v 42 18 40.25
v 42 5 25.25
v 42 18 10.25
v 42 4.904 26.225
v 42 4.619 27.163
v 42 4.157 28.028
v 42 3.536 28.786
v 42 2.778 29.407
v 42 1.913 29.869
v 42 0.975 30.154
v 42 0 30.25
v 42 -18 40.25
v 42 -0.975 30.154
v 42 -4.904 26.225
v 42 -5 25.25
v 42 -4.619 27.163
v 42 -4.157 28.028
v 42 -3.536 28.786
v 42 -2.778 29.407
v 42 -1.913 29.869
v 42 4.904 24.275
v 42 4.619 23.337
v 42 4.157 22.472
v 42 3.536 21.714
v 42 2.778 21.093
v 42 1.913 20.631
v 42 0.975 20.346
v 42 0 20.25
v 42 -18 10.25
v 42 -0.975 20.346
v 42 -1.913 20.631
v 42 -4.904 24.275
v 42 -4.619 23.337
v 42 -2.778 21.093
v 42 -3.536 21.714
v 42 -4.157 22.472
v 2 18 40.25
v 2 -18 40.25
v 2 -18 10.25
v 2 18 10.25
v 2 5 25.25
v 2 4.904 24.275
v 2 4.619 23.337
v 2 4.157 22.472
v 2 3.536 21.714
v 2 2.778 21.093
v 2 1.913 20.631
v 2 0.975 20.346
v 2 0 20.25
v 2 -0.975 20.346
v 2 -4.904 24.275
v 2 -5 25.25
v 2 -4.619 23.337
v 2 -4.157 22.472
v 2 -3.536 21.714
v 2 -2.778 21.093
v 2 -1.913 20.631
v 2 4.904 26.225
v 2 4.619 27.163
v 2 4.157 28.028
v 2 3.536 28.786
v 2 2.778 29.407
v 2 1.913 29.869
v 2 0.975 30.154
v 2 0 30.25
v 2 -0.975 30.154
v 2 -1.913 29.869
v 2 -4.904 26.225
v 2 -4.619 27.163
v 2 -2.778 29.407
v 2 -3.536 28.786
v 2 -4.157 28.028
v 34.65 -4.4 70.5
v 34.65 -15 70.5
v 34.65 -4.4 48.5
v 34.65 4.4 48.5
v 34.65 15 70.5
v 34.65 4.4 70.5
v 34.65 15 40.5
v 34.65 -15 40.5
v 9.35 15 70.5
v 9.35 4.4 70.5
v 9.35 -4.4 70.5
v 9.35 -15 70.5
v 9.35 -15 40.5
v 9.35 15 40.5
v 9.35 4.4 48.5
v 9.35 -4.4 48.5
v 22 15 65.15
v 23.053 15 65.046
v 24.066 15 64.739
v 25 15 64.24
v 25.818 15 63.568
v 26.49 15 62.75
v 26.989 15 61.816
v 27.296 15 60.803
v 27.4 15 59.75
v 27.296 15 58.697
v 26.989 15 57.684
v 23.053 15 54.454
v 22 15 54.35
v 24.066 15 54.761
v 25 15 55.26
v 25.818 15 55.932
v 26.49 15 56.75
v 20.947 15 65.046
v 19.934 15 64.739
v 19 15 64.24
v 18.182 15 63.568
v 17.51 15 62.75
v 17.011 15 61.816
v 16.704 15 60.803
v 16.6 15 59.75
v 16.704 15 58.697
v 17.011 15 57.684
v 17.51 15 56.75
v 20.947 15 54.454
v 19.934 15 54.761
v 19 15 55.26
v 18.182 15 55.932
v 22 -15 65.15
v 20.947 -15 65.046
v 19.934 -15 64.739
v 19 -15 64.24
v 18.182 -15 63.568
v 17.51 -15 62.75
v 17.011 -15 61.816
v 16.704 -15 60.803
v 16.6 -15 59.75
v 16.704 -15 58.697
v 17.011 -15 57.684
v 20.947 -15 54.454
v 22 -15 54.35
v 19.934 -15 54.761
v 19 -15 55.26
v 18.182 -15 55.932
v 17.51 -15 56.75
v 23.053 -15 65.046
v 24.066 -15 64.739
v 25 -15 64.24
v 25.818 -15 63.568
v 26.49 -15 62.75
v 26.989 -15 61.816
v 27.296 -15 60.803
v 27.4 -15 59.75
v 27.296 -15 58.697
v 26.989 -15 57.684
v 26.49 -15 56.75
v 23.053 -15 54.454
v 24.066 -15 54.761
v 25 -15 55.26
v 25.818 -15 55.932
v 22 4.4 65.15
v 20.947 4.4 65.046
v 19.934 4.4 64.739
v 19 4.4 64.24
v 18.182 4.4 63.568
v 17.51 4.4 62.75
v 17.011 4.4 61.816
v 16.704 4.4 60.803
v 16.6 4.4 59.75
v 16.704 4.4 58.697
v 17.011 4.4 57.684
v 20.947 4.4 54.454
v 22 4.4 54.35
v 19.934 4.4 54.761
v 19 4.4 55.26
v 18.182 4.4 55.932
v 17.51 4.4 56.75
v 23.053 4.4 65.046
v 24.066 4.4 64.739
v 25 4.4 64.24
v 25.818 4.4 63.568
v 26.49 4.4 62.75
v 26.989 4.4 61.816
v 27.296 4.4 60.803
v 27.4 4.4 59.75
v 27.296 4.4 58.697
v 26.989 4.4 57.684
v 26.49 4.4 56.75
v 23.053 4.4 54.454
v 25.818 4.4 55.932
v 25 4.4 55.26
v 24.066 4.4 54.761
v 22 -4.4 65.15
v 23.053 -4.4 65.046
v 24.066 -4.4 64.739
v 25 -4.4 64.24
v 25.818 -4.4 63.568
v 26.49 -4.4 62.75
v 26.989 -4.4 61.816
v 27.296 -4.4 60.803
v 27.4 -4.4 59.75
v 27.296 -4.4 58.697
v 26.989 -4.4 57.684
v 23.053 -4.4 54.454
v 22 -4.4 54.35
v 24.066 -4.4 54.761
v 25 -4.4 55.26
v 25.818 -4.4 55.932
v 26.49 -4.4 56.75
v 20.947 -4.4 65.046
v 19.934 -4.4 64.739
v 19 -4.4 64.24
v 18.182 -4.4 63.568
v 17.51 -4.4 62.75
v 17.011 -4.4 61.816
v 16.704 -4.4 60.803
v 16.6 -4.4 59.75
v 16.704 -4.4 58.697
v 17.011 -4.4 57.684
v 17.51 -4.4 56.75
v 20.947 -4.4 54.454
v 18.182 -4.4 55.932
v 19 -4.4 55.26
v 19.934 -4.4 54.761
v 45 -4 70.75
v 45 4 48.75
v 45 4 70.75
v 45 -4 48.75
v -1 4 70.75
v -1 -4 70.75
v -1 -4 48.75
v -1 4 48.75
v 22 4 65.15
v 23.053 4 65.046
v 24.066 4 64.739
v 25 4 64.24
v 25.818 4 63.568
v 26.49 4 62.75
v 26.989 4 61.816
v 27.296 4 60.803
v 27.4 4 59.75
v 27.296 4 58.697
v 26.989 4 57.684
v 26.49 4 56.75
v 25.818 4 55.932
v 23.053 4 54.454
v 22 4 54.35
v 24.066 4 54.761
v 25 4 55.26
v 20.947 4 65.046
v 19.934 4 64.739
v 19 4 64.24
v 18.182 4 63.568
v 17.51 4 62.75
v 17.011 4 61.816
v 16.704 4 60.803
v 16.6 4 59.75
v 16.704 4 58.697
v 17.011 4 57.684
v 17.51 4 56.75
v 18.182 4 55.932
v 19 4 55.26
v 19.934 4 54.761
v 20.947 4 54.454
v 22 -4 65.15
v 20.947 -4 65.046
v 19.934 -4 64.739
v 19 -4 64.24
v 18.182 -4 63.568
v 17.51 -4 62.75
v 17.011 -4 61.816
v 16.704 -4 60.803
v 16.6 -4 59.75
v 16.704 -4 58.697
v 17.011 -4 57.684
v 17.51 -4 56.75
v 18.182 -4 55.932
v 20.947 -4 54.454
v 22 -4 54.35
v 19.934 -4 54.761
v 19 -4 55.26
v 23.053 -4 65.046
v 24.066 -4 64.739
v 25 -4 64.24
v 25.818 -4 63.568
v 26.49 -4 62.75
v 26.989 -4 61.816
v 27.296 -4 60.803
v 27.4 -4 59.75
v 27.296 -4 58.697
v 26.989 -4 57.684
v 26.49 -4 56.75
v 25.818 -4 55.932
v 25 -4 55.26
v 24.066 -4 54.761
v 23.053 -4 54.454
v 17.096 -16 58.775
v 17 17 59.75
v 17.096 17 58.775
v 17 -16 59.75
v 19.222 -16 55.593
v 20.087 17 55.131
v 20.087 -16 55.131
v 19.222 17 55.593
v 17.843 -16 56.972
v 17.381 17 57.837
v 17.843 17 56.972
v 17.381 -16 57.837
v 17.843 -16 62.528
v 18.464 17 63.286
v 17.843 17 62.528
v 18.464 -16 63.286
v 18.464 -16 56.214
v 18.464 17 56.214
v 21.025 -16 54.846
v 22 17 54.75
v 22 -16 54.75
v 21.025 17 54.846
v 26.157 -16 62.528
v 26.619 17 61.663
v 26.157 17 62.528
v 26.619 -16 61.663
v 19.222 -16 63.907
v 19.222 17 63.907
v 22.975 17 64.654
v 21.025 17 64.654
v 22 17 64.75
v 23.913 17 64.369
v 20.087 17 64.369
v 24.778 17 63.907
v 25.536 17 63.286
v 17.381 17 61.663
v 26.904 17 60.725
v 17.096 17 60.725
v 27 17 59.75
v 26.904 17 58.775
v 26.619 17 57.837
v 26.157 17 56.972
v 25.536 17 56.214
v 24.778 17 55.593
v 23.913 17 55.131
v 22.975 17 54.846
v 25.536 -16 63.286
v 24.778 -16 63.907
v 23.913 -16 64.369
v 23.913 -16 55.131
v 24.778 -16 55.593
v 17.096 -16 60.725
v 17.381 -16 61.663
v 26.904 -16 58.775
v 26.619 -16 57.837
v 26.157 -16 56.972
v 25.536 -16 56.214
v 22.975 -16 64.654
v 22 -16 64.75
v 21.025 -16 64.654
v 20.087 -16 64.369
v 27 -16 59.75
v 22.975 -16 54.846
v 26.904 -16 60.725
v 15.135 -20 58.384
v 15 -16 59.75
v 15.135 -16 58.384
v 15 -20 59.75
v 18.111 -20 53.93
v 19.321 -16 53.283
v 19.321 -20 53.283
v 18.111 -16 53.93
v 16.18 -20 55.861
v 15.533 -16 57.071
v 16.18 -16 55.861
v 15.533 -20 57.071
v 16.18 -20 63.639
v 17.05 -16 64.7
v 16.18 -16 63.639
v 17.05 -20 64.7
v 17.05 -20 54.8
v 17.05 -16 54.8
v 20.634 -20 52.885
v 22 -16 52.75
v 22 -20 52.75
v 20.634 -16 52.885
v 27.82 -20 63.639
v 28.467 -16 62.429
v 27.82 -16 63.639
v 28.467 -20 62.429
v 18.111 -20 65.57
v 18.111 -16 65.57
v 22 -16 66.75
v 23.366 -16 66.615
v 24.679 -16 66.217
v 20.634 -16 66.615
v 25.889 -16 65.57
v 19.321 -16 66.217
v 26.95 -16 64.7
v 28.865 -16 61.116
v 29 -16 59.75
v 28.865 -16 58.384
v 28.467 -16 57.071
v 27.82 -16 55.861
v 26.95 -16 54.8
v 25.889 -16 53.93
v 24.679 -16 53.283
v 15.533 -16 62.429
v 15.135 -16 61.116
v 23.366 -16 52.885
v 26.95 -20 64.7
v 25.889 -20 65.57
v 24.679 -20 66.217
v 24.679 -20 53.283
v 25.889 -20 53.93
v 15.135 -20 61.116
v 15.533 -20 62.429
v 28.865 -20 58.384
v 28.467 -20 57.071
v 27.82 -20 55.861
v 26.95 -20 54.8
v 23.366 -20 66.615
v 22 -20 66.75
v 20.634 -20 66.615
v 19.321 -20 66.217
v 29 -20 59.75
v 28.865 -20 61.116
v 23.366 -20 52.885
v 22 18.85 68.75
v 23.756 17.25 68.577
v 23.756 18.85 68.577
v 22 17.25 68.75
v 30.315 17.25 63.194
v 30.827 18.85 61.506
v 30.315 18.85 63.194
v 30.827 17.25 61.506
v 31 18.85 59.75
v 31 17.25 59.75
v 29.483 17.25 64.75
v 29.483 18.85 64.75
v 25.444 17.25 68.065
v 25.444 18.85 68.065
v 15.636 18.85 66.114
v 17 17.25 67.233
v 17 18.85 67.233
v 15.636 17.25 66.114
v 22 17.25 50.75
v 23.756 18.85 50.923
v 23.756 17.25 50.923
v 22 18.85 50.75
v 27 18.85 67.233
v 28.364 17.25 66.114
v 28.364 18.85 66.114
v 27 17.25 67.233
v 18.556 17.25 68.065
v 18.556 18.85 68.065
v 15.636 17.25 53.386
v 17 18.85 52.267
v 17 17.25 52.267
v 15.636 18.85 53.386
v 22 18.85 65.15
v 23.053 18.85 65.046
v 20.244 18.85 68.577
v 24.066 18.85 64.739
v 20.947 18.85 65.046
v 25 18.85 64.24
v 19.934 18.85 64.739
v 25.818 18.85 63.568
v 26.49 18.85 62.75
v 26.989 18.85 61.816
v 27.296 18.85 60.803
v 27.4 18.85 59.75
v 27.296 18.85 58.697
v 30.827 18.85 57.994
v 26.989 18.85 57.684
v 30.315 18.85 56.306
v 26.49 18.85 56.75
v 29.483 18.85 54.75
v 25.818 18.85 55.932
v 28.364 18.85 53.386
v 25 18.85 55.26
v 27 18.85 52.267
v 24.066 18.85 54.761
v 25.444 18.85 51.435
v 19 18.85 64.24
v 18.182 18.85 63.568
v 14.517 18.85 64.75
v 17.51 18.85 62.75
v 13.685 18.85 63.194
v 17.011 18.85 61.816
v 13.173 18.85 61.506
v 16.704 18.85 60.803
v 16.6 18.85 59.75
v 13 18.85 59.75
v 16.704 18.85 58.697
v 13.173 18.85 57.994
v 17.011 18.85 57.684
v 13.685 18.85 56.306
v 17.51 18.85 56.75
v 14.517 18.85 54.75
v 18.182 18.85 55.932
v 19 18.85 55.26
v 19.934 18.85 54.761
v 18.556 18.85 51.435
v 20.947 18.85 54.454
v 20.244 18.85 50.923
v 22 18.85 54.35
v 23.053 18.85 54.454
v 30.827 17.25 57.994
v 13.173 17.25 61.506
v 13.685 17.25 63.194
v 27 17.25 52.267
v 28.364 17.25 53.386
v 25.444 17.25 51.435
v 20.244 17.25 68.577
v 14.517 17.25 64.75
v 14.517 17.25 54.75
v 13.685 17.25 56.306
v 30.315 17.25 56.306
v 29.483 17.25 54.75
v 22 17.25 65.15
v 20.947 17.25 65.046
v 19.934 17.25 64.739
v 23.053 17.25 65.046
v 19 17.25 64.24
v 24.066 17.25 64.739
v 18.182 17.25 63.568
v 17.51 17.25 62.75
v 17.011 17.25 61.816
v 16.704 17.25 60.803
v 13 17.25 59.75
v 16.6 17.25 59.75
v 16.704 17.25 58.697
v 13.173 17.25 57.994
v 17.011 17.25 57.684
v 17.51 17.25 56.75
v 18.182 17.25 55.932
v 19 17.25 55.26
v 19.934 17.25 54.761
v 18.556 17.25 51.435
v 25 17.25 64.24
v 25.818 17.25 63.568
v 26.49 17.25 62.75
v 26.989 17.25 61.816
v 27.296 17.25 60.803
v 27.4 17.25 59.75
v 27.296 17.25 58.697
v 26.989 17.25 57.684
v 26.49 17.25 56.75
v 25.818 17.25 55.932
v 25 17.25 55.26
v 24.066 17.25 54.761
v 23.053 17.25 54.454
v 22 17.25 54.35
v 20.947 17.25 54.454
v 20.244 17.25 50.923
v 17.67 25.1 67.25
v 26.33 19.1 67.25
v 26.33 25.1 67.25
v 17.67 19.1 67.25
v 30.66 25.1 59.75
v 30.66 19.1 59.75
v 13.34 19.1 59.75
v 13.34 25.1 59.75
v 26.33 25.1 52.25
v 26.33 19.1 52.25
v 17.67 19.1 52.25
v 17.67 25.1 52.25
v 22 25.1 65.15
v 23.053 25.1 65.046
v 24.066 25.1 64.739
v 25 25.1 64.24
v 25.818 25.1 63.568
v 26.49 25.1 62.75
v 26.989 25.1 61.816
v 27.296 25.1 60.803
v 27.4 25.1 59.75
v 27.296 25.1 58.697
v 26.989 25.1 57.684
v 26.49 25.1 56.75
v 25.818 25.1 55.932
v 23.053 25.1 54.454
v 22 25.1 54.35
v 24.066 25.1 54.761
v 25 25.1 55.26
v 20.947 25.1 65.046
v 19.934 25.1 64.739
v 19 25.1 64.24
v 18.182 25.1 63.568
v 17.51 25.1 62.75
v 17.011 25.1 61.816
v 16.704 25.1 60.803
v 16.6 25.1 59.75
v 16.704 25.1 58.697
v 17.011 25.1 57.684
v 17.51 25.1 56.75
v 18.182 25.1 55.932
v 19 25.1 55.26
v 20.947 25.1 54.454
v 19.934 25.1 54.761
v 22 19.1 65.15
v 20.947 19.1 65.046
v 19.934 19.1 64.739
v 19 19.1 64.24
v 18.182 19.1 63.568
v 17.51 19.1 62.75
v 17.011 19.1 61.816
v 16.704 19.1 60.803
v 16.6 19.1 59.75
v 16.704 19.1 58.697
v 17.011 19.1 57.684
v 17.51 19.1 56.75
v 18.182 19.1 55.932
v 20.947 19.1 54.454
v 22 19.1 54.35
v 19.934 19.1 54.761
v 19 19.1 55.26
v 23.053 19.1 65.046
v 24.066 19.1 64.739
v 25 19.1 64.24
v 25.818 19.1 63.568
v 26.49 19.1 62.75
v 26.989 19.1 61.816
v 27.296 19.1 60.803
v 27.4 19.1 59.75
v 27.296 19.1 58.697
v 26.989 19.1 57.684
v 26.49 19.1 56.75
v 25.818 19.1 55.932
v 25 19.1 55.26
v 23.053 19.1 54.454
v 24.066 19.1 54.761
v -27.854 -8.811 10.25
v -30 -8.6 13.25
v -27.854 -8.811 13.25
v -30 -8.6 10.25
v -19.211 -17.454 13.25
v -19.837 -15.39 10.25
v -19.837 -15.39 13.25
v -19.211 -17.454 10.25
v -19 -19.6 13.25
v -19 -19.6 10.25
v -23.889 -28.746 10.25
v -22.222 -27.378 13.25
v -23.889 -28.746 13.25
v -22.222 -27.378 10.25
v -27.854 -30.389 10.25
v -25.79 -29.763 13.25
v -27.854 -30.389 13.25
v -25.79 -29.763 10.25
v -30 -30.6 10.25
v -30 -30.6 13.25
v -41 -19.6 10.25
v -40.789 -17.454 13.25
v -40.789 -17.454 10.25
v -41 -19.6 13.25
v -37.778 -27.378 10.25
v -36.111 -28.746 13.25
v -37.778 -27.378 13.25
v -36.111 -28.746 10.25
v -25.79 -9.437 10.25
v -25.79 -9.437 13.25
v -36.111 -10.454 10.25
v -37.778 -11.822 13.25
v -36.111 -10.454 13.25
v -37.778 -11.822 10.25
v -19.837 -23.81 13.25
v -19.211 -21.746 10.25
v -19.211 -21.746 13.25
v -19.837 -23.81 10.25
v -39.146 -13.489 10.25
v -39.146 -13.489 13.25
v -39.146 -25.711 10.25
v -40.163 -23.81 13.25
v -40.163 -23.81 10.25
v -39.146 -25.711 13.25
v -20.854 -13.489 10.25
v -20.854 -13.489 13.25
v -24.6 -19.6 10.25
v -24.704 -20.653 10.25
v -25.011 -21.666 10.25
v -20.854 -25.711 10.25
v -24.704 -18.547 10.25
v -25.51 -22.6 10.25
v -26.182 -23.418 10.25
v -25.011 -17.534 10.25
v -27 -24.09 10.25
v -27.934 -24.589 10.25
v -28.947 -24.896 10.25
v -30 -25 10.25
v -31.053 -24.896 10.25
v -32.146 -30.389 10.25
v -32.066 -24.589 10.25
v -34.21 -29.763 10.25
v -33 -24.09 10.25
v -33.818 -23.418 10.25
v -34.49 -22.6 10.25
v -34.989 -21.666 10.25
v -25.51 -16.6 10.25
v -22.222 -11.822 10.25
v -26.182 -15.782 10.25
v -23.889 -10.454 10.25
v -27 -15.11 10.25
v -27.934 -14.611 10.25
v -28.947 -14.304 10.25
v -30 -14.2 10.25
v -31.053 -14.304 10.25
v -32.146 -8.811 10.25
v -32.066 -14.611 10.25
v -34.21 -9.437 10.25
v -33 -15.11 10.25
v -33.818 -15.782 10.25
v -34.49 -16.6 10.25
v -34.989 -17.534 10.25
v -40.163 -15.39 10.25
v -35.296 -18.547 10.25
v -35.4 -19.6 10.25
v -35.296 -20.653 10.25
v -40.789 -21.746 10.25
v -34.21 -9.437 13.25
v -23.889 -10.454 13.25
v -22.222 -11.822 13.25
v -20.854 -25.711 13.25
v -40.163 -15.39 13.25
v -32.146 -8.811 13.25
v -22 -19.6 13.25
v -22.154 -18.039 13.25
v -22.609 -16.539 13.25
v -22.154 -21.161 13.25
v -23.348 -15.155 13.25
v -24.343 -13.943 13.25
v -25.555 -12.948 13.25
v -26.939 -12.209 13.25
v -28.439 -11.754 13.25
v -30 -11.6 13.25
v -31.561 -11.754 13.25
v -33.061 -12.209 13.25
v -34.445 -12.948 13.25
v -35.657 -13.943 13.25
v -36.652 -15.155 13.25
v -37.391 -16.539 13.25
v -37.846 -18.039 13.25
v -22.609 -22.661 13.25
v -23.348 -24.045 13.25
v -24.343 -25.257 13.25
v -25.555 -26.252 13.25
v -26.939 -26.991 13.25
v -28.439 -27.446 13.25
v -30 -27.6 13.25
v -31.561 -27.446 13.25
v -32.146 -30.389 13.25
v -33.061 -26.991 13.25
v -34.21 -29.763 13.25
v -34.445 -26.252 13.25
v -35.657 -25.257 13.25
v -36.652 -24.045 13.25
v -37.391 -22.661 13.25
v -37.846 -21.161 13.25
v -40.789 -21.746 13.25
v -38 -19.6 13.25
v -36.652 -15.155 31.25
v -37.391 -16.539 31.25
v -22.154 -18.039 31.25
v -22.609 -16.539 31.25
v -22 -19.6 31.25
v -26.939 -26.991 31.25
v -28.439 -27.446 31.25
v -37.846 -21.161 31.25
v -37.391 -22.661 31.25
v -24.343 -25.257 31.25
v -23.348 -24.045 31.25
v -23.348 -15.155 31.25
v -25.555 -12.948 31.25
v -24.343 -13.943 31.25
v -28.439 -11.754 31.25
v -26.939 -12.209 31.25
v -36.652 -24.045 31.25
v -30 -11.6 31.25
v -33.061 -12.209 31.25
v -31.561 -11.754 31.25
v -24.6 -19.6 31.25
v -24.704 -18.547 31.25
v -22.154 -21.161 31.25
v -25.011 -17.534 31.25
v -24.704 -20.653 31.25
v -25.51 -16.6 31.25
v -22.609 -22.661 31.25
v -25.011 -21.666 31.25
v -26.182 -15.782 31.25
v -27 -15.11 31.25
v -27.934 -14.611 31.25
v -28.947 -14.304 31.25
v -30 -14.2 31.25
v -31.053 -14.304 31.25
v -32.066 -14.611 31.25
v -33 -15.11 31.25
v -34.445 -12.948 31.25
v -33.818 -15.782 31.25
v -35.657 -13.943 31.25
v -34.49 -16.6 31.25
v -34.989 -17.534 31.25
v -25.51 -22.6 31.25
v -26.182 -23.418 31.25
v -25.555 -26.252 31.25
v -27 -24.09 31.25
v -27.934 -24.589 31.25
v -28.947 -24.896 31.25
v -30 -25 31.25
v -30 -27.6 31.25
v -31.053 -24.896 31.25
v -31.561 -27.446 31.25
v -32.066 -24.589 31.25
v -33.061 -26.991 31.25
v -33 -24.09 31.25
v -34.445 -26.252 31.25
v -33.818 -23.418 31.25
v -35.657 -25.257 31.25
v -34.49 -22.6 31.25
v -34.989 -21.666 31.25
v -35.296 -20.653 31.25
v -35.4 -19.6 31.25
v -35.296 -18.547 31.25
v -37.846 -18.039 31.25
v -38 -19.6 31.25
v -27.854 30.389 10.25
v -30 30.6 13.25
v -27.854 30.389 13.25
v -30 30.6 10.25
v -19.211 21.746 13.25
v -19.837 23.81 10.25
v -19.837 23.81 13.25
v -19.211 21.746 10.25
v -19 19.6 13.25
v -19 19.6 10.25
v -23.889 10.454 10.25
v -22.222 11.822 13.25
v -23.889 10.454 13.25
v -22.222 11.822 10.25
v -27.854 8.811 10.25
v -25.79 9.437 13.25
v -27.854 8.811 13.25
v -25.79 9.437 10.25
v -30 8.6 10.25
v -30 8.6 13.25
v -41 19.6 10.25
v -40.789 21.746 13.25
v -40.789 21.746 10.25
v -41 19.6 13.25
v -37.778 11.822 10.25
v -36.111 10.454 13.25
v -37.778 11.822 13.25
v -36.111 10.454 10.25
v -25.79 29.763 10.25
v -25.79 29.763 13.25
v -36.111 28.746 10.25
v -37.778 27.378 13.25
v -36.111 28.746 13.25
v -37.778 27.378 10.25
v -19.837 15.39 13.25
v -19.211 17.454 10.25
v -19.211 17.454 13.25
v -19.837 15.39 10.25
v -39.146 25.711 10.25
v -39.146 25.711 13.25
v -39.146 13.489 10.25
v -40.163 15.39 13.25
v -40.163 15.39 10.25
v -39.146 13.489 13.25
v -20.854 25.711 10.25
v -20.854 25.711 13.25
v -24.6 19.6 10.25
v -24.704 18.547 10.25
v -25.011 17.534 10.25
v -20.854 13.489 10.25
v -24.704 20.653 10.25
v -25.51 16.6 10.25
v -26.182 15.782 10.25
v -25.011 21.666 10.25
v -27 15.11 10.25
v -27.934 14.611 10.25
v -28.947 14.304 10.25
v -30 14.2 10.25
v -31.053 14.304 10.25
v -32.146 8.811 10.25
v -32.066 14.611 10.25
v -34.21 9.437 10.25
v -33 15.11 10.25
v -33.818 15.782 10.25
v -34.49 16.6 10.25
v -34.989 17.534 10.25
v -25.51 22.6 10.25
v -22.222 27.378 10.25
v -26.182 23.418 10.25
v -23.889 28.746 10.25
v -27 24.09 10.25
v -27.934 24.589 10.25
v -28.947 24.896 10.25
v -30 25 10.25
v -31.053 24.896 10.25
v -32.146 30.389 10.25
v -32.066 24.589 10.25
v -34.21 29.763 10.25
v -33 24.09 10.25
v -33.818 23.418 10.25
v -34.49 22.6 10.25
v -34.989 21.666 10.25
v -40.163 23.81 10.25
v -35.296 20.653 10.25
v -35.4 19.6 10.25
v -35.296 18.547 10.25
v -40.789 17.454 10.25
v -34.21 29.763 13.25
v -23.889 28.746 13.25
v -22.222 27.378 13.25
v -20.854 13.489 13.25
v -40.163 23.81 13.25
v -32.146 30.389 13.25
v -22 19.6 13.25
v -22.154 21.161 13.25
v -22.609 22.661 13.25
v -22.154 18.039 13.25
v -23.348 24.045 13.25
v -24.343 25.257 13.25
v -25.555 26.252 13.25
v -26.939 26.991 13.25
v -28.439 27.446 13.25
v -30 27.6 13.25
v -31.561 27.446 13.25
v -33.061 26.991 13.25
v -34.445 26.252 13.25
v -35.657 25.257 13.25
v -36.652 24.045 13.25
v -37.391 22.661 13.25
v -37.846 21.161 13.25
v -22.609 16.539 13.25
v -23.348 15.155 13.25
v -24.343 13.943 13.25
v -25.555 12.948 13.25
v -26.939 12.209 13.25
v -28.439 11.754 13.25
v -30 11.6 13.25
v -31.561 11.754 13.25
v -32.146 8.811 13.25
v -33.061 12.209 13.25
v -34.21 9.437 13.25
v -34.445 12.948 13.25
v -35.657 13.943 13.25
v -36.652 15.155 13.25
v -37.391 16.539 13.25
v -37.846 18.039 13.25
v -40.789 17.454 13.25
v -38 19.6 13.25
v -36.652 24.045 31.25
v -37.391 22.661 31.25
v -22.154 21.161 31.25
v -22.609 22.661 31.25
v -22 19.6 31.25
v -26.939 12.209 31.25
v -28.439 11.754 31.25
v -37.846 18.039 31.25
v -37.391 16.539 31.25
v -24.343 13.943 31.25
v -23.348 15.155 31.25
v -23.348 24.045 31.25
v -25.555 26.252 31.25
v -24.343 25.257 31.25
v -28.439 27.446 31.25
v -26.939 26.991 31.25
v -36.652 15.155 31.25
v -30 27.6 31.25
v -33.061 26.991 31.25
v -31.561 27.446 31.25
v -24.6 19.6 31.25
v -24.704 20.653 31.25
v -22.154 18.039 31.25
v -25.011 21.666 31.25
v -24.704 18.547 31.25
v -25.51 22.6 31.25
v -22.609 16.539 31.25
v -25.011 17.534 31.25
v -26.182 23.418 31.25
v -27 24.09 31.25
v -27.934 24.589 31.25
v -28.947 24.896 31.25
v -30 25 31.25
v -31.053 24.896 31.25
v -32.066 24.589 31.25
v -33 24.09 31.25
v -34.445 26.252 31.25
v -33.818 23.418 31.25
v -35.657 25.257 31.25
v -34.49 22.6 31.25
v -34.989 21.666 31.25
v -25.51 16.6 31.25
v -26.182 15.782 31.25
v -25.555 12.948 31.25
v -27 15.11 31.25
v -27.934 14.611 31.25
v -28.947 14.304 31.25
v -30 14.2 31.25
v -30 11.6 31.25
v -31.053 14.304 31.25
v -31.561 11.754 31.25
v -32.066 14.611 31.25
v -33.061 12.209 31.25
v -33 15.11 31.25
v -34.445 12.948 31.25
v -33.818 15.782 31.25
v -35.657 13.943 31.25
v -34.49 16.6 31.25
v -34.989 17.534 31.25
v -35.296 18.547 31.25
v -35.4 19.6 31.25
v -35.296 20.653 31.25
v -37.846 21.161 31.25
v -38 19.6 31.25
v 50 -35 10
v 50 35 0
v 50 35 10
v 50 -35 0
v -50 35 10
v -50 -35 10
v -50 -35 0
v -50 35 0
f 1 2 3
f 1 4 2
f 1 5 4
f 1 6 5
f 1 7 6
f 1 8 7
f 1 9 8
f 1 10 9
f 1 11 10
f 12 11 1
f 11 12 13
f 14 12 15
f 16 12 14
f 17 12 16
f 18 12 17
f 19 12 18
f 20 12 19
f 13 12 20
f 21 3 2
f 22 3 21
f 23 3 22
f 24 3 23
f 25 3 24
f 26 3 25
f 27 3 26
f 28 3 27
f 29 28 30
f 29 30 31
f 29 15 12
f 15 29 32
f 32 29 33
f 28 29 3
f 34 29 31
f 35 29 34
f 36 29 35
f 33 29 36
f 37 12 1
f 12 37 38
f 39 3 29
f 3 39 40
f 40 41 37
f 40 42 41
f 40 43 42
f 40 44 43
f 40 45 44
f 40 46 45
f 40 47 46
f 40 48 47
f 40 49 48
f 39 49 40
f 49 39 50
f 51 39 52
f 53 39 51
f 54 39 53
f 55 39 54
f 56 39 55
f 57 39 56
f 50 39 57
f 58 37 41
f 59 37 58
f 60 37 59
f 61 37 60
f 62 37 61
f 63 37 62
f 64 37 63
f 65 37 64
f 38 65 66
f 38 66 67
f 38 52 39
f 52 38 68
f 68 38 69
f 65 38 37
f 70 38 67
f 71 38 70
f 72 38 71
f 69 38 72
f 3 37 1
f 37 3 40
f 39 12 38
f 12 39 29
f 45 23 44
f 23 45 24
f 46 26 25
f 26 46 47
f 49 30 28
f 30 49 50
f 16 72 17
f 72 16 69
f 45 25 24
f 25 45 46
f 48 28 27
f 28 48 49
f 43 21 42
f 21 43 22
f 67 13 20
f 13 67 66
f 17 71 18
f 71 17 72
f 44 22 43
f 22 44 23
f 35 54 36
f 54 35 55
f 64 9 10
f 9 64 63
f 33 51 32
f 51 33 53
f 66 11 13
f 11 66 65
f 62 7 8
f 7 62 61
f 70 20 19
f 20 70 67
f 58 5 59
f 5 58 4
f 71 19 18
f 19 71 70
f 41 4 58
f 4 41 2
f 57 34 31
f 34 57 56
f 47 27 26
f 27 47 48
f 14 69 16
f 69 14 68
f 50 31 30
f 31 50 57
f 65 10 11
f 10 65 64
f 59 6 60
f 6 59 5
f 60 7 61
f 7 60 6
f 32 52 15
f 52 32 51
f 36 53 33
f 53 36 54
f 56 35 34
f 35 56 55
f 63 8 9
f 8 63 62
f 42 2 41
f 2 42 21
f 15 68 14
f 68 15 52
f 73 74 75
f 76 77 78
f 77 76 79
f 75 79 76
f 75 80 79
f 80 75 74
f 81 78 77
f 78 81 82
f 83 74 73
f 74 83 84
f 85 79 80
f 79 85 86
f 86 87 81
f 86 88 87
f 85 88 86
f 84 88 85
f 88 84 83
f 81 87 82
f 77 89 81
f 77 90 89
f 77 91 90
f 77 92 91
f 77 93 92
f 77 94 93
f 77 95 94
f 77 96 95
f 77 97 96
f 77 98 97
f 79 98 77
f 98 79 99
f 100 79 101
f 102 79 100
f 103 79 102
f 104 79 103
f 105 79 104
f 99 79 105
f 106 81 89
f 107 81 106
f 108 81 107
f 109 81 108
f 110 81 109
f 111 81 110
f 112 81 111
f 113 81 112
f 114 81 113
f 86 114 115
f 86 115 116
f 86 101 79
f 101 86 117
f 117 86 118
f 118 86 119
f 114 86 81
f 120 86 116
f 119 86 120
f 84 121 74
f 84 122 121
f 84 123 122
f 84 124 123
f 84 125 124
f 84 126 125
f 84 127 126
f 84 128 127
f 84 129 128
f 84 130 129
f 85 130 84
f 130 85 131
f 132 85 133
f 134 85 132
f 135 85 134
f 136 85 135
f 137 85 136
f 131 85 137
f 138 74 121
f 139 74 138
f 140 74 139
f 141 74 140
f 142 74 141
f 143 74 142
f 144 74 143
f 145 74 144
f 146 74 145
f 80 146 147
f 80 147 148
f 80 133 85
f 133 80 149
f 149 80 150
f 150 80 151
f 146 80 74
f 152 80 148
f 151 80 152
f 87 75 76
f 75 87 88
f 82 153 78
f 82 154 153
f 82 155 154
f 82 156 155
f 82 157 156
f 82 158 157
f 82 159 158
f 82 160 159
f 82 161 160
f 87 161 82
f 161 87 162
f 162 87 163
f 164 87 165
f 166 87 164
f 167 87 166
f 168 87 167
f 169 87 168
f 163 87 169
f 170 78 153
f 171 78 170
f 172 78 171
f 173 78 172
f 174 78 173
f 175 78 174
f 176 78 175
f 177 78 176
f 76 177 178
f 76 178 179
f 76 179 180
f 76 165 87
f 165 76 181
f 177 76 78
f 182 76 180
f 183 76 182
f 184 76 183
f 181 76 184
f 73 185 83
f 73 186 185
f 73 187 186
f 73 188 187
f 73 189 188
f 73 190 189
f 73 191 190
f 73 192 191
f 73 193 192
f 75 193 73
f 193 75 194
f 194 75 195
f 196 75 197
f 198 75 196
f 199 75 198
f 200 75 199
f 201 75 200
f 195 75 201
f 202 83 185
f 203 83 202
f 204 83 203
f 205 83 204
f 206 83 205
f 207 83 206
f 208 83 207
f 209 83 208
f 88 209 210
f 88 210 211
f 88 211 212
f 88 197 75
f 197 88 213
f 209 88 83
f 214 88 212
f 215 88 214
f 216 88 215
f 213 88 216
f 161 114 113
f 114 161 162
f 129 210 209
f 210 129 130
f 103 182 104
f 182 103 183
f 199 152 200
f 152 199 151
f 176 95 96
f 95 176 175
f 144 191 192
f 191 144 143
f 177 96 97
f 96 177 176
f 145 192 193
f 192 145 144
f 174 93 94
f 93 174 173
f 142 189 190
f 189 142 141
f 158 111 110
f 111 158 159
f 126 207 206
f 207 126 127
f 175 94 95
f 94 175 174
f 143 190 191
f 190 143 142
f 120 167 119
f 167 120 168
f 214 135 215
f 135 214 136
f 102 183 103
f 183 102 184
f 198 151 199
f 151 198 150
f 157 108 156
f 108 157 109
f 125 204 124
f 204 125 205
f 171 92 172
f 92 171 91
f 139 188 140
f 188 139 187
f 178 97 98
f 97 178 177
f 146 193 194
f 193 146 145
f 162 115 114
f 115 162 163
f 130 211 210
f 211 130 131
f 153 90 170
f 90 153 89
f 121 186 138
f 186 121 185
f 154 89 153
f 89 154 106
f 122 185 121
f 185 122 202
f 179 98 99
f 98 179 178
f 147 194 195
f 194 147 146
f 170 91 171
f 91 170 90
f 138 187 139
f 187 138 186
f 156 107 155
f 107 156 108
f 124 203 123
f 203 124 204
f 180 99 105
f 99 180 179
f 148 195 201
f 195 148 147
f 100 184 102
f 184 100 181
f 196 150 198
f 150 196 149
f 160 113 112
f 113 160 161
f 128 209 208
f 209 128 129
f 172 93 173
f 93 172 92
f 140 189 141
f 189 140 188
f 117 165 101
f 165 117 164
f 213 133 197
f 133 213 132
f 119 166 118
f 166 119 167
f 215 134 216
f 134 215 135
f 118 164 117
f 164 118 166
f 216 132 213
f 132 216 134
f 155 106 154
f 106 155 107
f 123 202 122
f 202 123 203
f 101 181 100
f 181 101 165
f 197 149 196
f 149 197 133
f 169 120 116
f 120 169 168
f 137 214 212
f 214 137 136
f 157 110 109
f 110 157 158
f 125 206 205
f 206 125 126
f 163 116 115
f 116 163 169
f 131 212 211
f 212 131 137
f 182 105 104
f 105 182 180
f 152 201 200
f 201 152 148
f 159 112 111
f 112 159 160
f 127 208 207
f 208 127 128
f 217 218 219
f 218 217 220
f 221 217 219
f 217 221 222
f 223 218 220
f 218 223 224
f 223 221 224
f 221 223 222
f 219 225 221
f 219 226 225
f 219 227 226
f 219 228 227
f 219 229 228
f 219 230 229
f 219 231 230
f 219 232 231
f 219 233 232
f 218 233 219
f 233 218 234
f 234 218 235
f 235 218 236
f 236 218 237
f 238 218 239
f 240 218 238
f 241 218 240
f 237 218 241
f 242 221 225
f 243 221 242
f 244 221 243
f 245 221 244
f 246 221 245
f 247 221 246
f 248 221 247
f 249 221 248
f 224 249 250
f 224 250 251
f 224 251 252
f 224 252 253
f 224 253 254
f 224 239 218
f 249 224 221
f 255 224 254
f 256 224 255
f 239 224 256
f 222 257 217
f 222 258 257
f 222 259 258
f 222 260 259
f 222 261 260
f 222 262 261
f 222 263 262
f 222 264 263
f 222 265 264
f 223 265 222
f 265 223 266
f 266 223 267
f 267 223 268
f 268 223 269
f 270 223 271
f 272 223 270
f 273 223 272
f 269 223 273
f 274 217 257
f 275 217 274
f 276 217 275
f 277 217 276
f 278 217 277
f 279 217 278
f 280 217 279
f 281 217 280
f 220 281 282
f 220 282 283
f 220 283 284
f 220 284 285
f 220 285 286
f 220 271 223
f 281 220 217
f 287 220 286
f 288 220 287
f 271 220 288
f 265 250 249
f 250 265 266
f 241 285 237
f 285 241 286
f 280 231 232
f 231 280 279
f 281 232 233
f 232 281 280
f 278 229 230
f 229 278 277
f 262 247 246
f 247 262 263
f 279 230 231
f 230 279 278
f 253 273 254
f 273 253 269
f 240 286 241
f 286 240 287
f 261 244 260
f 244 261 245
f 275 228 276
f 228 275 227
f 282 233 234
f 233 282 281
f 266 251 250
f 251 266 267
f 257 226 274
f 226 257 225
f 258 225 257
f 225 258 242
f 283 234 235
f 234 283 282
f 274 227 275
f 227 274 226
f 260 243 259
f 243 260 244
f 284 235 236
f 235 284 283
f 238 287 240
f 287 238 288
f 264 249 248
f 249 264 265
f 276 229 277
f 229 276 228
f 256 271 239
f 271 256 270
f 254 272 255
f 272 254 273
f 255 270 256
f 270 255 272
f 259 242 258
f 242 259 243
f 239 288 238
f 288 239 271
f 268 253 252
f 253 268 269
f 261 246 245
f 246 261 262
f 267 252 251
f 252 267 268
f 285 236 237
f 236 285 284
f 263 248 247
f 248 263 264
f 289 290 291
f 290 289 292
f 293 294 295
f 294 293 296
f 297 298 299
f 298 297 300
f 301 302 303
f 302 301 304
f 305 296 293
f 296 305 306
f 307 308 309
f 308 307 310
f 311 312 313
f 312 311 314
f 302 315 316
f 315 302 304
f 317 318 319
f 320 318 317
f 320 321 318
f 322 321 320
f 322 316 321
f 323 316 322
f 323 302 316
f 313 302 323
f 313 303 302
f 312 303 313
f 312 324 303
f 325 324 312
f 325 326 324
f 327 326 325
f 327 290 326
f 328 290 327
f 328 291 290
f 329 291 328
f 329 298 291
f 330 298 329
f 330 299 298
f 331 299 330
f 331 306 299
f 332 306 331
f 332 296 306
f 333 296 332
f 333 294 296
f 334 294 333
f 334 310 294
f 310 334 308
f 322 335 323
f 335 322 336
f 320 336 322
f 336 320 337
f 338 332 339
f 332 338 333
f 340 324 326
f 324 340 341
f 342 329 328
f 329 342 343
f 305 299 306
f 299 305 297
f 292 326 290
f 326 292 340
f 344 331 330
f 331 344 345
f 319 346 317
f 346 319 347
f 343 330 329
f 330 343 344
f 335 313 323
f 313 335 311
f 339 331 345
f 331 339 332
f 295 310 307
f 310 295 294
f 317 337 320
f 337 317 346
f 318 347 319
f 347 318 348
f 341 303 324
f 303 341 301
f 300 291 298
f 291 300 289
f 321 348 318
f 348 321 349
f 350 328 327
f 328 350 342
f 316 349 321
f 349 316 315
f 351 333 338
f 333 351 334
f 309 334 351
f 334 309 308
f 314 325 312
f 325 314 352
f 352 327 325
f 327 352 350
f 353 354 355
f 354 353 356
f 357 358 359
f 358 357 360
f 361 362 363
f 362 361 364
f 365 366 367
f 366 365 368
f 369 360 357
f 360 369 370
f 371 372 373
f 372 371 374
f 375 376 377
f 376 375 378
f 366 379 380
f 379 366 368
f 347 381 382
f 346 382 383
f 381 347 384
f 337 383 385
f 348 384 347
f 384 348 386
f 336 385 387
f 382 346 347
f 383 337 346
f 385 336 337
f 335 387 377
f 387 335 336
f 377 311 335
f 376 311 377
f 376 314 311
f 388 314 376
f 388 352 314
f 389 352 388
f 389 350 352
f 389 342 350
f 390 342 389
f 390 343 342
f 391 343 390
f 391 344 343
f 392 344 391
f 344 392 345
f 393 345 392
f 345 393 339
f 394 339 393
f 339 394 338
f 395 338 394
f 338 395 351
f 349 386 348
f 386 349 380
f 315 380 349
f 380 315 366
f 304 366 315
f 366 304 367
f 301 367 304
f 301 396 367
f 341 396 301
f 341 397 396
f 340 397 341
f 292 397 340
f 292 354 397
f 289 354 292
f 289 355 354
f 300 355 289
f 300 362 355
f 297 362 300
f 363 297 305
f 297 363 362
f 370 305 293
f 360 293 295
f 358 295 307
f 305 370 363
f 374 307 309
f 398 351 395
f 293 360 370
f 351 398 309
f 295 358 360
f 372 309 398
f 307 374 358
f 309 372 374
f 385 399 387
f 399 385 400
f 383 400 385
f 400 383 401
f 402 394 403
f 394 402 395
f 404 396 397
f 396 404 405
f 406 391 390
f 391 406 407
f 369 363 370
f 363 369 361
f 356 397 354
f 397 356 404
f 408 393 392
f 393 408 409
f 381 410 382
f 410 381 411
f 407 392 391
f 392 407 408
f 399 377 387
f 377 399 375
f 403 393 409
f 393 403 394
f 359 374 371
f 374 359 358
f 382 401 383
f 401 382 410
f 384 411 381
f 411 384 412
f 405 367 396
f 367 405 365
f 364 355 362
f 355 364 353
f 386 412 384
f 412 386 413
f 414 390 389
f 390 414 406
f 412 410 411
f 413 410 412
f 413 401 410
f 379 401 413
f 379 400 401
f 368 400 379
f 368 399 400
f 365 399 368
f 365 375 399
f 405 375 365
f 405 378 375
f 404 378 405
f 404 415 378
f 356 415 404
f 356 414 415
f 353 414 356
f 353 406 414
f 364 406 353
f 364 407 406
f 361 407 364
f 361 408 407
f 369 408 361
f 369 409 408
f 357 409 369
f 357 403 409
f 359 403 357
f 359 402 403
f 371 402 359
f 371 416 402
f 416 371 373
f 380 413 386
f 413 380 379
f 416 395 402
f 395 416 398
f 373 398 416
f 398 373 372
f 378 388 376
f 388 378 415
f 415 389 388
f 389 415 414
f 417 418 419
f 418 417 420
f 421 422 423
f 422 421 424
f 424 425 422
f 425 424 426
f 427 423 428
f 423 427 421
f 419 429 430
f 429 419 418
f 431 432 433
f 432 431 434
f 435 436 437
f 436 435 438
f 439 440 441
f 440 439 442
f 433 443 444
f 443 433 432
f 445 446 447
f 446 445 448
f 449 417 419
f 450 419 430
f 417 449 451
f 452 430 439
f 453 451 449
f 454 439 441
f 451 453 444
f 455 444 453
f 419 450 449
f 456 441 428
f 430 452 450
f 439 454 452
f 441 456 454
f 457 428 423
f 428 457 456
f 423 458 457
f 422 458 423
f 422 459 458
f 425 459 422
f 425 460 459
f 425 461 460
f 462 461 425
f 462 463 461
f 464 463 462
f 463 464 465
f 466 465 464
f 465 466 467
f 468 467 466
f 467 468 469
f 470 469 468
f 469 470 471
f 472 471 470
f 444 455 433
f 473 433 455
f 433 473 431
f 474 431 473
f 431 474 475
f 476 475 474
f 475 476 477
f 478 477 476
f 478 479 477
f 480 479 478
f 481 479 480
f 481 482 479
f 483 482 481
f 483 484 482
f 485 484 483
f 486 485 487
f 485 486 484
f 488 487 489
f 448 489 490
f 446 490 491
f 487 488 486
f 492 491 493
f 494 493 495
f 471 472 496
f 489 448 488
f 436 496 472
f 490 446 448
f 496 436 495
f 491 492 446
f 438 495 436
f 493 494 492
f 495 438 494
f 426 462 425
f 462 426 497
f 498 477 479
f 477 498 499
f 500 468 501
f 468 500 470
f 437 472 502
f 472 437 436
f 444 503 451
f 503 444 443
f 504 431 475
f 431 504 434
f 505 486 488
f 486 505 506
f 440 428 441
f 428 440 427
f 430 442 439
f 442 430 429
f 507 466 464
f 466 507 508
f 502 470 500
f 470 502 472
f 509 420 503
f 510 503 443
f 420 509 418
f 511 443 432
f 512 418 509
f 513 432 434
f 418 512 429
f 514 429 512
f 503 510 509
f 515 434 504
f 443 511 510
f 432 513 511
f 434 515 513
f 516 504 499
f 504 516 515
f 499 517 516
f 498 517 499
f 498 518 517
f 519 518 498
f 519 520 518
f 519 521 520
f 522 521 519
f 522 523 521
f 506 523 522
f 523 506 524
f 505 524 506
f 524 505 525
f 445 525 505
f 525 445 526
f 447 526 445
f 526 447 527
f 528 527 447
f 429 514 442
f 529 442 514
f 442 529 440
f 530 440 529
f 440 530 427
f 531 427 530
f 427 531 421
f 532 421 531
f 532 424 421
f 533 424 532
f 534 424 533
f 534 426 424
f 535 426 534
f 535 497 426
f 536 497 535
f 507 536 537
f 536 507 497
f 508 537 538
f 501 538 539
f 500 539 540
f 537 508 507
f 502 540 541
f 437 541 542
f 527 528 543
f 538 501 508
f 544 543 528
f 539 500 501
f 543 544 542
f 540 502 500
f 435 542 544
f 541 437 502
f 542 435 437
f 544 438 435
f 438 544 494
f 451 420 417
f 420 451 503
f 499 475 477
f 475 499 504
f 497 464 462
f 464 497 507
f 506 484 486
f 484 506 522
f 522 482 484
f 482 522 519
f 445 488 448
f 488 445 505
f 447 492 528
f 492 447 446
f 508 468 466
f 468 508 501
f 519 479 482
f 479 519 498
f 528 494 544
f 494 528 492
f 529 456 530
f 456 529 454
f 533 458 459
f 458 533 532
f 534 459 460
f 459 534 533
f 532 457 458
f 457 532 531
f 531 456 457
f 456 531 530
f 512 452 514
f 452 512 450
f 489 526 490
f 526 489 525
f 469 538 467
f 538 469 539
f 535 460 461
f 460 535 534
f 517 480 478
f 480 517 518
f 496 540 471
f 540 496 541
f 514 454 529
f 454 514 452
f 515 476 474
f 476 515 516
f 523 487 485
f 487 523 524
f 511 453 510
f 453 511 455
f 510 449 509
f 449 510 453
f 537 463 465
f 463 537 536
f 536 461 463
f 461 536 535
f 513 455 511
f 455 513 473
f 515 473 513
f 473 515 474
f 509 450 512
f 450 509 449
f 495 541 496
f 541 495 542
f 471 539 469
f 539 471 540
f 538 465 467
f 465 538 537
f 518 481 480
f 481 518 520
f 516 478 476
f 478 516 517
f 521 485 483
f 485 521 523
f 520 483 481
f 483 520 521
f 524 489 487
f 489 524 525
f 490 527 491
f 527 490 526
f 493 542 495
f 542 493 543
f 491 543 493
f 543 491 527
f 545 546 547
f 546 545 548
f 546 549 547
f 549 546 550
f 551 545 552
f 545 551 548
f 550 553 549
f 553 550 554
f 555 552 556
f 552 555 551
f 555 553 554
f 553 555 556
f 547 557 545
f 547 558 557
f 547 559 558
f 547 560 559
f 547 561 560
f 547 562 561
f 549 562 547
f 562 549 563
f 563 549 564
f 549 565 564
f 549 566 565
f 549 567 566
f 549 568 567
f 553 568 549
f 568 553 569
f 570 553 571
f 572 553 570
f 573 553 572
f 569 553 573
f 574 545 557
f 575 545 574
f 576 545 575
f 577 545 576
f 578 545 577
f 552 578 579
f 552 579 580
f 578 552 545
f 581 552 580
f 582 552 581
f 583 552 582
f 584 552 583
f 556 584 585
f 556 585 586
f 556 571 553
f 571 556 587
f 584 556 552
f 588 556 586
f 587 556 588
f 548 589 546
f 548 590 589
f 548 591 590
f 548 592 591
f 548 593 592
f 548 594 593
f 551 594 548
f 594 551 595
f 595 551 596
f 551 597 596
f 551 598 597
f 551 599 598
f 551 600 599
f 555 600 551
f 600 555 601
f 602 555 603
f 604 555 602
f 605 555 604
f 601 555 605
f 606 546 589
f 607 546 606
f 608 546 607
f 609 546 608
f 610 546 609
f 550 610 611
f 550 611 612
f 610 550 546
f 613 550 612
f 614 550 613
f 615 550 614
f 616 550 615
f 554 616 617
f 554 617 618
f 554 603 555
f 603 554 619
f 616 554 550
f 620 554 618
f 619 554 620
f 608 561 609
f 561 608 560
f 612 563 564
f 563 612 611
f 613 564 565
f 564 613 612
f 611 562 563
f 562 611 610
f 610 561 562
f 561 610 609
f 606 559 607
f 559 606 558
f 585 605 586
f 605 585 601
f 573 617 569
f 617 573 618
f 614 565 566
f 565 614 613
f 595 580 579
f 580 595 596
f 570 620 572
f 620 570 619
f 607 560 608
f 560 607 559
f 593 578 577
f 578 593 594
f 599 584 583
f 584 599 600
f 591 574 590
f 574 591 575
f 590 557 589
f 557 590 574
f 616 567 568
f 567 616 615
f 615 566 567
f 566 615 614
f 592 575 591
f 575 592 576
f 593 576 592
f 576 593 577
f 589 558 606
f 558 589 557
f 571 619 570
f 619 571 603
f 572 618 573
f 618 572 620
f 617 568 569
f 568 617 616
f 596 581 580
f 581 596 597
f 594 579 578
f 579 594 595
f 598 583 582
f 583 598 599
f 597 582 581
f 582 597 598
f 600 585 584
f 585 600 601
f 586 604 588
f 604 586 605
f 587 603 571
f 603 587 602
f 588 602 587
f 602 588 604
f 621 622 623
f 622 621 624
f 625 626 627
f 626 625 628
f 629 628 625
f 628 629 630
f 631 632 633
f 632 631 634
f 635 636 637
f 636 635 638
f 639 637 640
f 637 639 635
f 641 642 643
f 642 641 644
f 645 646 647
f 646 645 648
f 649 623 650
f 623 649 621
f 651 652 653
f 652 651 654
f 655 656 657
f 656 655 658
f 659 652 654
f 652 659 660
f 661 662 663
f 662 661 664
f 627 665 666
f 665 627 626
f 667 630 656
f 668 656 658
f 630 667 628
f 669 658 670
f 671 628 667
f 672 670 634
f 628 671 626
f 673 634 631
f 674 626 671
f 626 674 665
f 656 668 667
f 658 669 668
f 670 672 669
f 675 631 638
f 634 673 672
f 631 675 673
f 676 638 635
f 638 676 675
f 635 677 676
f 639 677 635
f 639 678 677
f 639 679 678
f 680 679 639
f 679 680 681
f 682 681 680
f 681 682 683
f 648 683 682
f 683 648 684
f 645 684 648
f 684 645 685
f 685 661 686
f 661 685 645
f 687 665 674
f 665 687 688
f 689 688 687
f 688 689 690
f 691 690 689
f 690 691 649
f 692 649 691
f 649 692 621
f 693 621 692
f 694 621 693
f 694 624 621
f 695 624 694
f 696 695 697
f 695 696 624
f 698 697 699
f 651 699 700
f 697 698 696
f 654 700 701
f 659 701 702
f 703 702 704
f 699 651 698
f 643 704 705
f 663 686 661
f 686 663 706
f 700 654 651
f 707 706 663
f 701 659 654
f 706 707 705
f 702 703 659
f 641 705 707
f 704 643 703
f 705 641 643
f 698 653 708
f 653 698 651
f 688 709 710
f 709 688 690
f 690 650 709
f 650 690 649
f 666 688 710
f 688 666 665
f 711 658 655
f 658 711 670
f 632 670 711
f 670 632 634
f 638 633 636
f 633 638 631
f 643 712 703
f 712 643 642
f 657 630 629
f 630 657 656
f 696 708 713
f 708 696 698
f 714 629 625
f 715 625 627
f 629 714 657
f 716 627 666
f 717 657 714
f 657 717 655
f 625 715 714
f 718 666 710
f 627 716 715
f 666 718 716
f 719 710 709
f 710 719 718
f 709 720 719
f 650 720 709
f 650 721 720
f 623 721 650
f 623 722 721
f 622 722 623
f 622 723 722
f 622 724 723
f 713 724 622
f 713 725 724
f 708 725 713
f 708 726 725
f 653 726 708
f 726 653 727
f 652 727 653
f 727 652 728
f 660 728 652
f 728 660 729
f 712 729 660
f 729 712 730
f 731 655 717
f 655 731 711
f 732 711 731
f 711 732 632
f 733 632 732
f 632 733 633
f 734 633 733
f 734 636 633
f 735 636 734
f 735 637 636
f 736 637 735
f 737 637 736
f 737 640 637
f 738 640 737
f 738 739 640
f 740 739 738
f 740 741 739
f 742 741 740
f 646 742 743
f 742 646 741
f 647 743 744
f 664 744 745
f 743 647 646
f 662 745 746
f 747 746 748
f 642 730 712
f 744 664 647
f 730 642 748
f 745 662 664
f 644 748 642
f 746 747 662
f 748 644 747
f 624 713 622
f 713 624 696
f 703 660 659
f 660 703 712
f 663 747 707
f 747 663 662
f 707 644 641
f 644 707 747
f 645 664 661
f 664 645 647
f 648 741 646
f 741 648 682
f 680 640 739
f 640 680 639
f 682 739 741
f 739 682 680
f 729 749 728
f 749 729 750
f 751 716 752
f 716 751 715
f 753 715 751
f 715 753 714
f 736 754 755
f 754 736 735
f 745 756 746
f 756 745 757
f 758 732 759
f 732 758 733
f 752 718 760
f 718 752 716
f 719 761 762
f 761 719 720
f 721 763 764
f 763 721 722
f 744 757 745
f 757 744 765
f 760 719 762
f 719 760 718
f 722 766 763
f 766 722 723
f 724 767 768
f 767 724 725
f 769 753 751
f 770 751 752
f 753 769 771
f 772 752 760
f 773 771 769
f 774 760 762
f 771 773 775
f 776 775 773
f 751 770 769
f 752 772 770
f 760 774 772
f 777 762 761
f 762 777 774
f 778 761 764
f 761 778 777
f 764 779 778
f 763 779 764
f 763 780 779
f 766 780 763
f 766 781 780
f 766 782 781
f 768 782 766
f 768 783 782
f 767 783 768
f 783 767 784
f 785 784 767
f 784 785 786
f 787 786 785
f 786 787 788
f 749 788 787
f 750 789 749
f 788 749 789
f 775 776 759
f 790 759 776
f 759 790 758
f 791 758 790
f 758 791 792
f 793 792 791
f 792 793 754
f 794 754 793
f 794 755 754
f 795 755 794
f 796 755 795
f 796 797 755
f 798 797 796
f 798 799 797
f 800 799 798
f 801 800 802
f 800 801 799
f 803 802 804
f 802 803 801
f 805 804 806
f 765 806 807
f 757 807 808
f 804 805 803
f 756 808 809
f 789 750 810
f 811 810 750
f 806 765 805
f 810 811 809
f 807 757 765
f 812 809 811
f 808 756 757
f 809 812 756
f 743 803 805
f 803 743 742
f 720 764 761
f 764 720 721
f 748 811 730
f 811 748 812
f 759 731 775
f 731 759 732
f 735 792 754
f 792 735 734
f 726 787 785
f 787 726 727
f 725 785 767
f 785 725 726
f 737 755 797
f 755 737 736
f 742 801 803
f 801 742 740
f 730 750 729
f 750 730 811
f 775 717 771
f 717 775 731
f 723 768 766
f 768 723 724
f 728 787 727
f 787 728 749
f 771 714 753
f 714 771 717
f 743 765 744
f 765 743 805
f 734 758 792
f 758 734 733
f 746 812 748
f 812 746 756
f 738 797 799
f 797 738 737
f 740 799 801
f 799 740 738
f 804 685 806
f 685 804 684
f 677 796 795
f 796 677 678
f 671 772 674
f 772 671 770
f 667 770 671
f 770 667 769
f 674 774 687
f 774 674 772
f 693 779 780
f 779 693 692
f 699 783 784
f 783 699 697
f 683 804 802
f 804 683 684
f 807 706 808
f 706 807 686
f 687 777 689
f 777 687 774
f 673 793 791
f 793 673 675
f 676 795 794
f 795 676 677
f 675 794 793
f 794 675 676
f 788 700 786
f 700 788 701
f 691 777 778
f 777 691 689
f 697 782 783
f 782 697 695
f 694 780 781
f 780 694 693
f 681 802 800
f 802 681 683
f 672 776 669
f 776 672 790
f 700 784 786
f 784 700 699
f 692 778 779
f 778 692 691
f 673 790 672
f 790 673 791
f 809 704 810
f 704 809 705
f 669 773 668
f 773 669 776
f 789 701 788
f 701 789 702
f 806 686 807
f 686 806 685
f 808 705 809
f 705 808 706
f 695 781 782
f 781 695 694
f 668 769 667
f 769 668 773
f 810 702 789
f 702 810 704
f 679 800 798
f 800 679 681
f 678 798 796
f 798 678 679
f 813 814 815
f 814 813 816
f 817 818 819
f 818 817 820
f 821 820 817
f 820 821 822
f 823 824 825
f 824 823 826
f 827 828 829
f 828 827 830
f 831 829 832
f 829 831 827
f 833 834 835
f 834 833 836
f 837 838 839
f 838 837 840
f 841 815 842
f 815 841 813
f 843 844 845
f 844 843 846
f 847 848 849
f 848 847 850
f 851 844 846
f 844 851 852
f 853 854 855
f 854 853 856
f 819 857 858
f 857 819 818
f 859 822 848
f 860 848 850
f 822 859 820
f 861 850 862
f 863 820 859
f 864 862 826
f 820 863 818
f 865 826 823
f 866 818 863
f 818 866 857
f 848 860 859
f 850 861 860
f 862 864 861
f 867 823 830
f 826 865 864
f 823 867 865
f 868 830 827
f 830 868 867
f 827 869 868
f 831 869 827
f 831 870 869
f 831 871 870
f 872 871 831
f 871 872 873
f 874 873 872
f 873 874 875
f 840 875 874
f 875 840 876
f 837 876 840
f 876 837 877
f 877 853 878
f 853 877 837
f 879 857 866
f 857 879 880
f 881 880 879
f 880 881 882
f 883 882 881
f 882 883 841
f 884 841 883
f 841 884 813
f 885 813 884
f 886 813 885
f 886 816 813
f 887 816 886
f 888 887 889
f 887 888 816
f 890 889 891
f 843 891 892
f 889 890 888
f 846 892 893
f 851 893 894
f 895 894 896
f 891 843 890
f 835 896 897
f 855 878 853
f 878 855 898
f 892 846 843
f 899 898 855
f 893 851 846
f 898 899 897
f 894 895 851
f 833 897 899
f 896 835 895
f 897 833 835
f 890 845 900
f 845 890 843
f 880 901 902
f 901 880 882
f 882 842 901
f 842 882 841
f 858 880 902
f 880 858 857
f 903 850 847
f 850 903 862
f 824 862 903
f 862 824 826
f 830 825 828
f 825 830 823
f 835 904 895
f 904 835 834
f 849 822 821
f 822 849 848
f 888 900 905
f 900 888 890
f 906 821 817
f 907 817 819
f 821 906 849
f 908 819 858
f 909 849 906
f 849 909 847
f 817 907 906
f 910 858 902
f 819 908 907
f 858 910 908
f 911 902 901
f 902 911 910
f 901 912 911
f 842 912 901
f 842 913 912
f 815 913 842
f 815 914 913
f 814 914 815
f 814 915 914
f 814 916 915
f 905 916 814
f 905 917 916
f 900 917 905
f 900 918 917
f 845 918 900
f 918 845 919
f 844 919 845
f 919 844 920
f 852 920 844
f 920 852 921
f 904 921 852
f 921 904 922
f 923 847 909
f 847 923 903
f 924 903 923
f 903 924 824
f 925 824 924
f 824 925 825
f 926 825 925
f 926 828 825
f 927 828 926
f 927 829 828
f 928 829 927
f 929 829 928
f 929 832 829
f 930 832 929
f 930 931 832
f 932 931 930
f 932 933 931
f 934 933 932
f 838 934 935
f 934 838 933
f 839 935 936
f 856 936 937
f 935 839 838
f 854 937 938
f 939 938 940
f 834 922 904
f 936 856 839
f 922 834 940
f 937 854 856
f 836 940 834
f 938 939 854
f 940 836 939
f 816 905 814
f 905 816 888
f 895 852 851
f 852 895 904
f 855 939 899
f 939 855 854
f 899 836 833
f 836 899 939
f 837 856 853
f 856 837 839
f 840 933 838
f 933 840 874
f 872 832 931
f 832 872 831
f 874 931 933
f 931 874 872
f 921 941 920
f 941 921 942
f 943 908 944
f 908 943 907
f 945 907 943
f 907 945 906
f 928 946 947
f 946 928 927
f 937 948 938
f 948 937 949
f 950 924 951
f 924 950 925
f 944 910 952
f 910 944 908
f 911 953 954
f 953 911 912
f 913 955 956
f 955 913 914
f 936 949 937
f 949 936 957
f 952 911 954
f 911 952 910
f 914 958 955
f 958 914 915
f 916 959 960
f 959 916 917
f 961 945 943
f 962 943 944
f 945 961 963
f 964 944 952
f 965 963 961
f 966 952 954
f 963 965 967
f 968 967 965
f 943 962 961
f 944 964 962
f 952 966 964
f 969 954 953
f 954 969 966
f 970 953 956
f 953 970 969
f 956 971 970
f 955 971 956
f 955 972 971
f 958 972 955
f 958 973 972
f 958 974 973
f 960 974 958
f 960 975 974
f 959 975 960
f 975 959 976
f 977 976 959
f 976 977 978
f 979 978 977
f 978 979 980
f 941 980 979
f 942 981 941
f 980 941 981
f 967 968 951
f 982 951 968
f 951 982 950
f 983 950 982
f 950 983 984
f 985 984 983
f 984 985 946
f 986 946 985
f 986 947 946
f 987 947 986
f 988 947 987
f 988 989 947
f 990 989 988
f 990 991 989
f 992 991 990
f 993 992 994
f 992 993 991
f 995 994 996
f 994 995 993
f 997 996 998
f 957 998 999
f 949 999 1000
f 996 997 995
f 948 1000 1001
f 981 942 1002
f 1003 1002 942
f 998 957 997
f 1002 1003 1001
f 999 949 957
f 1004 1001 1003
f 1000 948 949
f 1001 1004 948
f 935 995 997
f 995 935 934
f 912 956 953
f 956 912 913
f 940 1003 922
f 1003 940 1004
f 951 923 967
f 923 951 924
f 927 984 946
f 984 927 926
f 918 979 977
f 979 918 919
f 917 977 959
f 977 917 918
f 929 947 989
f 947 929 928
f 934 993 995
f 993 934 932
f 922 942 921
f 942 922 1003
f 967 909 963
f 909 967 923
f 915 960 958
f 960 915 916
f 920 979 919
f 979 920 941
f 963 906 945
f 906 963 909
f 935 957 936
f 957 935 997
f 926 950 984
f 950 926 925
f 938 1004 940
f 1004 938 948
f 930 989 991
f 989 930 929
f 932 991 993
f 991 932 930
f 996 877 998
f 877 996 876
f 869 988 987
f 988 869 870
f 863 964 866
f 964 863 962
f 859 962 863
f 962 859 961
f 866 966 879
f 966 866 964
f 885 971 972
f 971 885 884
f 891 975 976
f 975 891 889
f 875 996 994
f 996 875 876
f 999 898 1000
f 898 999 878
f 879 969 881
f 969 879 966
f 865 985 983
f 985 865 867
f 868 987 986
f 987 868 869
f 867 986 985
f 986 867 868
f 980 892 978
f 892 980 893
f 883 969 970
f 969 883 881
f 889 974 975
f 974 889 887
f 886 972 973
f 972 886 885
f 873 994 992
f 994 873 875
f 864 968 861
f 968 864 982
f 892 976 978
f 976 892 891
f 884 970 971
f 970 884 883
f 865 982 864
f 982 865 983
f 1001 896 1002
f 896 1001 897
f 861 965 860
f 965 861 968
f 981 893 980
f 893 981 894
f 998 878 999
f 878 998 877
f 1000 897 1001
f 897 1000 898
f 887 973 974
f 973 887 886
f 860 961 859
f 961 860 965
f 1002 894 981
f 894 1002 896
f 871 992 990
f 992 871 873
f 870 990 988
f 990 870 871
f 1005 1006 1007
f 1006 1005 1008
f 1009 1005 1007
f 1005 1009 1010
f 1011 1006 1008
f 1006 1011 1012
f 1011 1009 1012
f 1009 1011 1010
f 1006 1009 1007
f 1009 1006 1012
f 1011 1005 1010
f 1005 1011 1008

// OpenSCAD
$fn = 32;

// ------------------------------------------------------------------------
// Indexing jig: plate 100 x 70 mm, pin d10
// Every part is its own module, assembly() places every instance.
// ------------------------------------------------------------------------

// --- part 1 ---
module jig_plate() {
  difference() {
    translate([-50, -35, 0]) cube([100, 70, 10]);
  }
}

// --- part 2 ---
module locator_block() {
  difference() {
    translate([-20, -18, 0]) cube([40, 36, 30]);
    translate([0, 0, 15]) rotate([0, 90, 0]) cylinder(h = 42, d = 10, center = true);
  }
}

// --- part 3 ---
module index_fork() {
  difference() {
    translate([-12.65, -15, 0]) cube([25.3, 30, 30]);
    translate([-13.65, -4.4, 8]) cube([27.3, 8.8, 23]);
    translate([0, 0, 19.25]) rotate([90, 0, 0]) cylinder(h = 32, d = 10.8, center = true);
  }
}

// --- part 4 ---
module index_arm() {
  difference() {
    translate([-23, -4, 0]) cube([46, 8, 22]);
    translate([0, 0, 11]) rotate([90, 0, 0]) cylinder(h = 10, d = 10.8, center = true);
  }
}

// --- part 5 ---
module index_pin() {
  rotate([0, 90, 0]) cylinder(h = 34, d = 10, center = true);
  translate([-20, 0, 0]) rotate([0, 90, 0]) cylinder(h = 4, d = 14);
}

// --- part 6 ---
module pin_washer() {
  difference() {
      translate([0, 0, 0]) cylinder(h = 1.6, d = 18);
      translate([0, 0, -1]) cylinder(h = 3.6, d = 10.8);
    }
}

// --- part 7 ---
module lock_nut() {
  difference() {
    linear_extrude(height = 6) polygon(points = [[8.66, 0], [4.33, 7.5], [-4.33, 7.5], [-8.66, 0], [-4.33, -7.5], [4.33, -7.5]]);
    translate([0, 0, -1]) cylinder(h = 8, d = 10.8);
  }
}

// --- part 8 ---
module guide_bush_a() {
  difference() {
    union() {
      cylinder(h = 3, d = 22);
      translate([0, 0, 3]) cylinder(h = 18, d = 16);
    }
    translate([0, 0, -1]) cylinder(h = 23, d = 10.8);
  }
}

// --- part 9 ---
module guide_bush_b() {
  difference() {
    union() {
      cylinder(h = 3, d = 22);
      translate([0, 0, 3]) cylinder(h = 18, d = 16);
    }
    translate([0, 0, -1]) cylinder(h = 23, d = 10.8);
  }
}

// --- assembly ---
module assembly() {
  color([0.80, 0.24, 0.20]) translate([0, 0, 0]) rotate([0, 0, 0]) jig_plate();
  color([0.20, 0.45, 0.75]) translate([22, 0, 10.25]) rotate([0, 0, 0]) locator_block();
  color([0.25, 0.62, 0.32]) translate([22, 0, 40.5]) rotate([0, 0, 0]) index_fork();
  color([0.92, 0.70, 0.18]) translate([22, 0, 48.75]) rotate([0, 0, 0]) index_arm();
  color([0.58, 0.35, 0.70]) translate([22, 0, 59.75]) rotate([0, 0, 90]) index_pin();
  color([0.16, 0.66, 0.66]) translate([22, 18.85, 59.75]) rotate([90, 0, 0]) pin_washer();
  color([0.85, 0.48, 0.18]) translate([22, 25.1, 59.75]) rotate([90, 0, 0]) lock_nut();
  color([0.55, 0.60, 0.65]) translate([-30, -19.6, 10.25]) rotate([0, 0, 0]) guide_bush_a();
  color([0.75, 0.30, 0.55]) translate([-30, 19.6, 10.25]) rotate([0, 0, 0]) guide_bush_b();
}

assembly();
